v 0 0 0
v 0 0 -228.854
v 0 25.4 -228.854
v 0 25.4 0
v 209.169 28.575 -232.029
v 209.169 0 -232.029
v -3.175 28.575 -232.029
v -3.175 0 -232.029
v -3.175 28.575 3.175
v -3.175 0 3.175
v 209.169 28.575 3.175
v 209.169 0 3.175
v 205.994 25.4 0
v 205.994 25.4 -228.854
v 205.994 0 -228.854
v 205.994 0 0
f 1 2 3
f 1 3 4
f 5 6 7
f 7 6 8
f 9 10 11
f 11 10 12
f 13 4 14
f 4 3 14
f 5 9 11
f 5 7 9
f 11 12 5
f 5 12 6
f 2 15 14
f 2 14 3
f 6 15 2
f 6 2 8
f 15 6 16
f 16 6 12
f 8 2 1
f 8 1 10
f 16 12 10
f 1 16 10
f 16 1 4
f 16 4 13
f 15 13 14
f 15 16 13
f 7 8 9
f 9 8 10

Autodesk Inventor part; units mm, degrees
ref_plane "YZ Plane" through (0, 0, 0) normal (1, 0, 0) x (0, 1, 0)
ref_plane "XZ Plane" through (0, 0, 0) normal (0, 1, 0) x (-1, 0, 0)
ref_plane "XY Plane" through (0, 0, 0) normal (0, 0, 1) x (1, 0, 0)
sketch "Sketch1" plane through (0, 0, 0) normal (0, 1, 0) x (-1, 0, 0)
  line L0 (0, 0) -> (-205.994, 0)
  line L1 (-205.994, 0) -> (-205.994, -228.854)
  line L2 (-205.994, -228.854) -> (0, -228.854)
  line L3 (0, -228.854) -> (0, 0)
  line L4 (-209.169, -232.029) -> (3.175, -232.029)
  line L5 (3.175, -232.029) -> (3.175, 3.175)
  line L6 (3.175, 3.175) -> (-209.169, 3.175)
  line L7 (-209.169, 3.175) -> (-209.169, -232.029)
  dimension "d0" = 205.994
  dimension "d1" = 228.854
  dimension "d2" = 3.175
  dimension "d3" = 3.175
  dimension "d4" = 3.175
  dimension "d5" = 3.175
extrude "Extrusion2" add sketch "Sketch1" along normal blind 25.4
sketch "Sketch2" plane through (0, 25.4, 0) normal (0, 1, 0) x (1, 0, 0)
  line L0 (-3.175, 232.029) -> (-3.175, -3.175) projected
  line L1 (-3.175, -3.175) -> (209.169, -3.175) projected
  line L2 (209.169, -3.175) -> (209.169, 232.029) projected
  line L3 (209.169, 232.029) -> (-3.175, 232.029) projected
  point P0 (0, 0)
extrude "Extrusion3" add sketch "Sketch2" along normal blind 3.175
sketch "Sketch4" plane through (0, 25.4, 0) normal (0, -1, 0) x (1, 0, 0)
  point P0 (0, 0)
properties part number "FishTankLid"
